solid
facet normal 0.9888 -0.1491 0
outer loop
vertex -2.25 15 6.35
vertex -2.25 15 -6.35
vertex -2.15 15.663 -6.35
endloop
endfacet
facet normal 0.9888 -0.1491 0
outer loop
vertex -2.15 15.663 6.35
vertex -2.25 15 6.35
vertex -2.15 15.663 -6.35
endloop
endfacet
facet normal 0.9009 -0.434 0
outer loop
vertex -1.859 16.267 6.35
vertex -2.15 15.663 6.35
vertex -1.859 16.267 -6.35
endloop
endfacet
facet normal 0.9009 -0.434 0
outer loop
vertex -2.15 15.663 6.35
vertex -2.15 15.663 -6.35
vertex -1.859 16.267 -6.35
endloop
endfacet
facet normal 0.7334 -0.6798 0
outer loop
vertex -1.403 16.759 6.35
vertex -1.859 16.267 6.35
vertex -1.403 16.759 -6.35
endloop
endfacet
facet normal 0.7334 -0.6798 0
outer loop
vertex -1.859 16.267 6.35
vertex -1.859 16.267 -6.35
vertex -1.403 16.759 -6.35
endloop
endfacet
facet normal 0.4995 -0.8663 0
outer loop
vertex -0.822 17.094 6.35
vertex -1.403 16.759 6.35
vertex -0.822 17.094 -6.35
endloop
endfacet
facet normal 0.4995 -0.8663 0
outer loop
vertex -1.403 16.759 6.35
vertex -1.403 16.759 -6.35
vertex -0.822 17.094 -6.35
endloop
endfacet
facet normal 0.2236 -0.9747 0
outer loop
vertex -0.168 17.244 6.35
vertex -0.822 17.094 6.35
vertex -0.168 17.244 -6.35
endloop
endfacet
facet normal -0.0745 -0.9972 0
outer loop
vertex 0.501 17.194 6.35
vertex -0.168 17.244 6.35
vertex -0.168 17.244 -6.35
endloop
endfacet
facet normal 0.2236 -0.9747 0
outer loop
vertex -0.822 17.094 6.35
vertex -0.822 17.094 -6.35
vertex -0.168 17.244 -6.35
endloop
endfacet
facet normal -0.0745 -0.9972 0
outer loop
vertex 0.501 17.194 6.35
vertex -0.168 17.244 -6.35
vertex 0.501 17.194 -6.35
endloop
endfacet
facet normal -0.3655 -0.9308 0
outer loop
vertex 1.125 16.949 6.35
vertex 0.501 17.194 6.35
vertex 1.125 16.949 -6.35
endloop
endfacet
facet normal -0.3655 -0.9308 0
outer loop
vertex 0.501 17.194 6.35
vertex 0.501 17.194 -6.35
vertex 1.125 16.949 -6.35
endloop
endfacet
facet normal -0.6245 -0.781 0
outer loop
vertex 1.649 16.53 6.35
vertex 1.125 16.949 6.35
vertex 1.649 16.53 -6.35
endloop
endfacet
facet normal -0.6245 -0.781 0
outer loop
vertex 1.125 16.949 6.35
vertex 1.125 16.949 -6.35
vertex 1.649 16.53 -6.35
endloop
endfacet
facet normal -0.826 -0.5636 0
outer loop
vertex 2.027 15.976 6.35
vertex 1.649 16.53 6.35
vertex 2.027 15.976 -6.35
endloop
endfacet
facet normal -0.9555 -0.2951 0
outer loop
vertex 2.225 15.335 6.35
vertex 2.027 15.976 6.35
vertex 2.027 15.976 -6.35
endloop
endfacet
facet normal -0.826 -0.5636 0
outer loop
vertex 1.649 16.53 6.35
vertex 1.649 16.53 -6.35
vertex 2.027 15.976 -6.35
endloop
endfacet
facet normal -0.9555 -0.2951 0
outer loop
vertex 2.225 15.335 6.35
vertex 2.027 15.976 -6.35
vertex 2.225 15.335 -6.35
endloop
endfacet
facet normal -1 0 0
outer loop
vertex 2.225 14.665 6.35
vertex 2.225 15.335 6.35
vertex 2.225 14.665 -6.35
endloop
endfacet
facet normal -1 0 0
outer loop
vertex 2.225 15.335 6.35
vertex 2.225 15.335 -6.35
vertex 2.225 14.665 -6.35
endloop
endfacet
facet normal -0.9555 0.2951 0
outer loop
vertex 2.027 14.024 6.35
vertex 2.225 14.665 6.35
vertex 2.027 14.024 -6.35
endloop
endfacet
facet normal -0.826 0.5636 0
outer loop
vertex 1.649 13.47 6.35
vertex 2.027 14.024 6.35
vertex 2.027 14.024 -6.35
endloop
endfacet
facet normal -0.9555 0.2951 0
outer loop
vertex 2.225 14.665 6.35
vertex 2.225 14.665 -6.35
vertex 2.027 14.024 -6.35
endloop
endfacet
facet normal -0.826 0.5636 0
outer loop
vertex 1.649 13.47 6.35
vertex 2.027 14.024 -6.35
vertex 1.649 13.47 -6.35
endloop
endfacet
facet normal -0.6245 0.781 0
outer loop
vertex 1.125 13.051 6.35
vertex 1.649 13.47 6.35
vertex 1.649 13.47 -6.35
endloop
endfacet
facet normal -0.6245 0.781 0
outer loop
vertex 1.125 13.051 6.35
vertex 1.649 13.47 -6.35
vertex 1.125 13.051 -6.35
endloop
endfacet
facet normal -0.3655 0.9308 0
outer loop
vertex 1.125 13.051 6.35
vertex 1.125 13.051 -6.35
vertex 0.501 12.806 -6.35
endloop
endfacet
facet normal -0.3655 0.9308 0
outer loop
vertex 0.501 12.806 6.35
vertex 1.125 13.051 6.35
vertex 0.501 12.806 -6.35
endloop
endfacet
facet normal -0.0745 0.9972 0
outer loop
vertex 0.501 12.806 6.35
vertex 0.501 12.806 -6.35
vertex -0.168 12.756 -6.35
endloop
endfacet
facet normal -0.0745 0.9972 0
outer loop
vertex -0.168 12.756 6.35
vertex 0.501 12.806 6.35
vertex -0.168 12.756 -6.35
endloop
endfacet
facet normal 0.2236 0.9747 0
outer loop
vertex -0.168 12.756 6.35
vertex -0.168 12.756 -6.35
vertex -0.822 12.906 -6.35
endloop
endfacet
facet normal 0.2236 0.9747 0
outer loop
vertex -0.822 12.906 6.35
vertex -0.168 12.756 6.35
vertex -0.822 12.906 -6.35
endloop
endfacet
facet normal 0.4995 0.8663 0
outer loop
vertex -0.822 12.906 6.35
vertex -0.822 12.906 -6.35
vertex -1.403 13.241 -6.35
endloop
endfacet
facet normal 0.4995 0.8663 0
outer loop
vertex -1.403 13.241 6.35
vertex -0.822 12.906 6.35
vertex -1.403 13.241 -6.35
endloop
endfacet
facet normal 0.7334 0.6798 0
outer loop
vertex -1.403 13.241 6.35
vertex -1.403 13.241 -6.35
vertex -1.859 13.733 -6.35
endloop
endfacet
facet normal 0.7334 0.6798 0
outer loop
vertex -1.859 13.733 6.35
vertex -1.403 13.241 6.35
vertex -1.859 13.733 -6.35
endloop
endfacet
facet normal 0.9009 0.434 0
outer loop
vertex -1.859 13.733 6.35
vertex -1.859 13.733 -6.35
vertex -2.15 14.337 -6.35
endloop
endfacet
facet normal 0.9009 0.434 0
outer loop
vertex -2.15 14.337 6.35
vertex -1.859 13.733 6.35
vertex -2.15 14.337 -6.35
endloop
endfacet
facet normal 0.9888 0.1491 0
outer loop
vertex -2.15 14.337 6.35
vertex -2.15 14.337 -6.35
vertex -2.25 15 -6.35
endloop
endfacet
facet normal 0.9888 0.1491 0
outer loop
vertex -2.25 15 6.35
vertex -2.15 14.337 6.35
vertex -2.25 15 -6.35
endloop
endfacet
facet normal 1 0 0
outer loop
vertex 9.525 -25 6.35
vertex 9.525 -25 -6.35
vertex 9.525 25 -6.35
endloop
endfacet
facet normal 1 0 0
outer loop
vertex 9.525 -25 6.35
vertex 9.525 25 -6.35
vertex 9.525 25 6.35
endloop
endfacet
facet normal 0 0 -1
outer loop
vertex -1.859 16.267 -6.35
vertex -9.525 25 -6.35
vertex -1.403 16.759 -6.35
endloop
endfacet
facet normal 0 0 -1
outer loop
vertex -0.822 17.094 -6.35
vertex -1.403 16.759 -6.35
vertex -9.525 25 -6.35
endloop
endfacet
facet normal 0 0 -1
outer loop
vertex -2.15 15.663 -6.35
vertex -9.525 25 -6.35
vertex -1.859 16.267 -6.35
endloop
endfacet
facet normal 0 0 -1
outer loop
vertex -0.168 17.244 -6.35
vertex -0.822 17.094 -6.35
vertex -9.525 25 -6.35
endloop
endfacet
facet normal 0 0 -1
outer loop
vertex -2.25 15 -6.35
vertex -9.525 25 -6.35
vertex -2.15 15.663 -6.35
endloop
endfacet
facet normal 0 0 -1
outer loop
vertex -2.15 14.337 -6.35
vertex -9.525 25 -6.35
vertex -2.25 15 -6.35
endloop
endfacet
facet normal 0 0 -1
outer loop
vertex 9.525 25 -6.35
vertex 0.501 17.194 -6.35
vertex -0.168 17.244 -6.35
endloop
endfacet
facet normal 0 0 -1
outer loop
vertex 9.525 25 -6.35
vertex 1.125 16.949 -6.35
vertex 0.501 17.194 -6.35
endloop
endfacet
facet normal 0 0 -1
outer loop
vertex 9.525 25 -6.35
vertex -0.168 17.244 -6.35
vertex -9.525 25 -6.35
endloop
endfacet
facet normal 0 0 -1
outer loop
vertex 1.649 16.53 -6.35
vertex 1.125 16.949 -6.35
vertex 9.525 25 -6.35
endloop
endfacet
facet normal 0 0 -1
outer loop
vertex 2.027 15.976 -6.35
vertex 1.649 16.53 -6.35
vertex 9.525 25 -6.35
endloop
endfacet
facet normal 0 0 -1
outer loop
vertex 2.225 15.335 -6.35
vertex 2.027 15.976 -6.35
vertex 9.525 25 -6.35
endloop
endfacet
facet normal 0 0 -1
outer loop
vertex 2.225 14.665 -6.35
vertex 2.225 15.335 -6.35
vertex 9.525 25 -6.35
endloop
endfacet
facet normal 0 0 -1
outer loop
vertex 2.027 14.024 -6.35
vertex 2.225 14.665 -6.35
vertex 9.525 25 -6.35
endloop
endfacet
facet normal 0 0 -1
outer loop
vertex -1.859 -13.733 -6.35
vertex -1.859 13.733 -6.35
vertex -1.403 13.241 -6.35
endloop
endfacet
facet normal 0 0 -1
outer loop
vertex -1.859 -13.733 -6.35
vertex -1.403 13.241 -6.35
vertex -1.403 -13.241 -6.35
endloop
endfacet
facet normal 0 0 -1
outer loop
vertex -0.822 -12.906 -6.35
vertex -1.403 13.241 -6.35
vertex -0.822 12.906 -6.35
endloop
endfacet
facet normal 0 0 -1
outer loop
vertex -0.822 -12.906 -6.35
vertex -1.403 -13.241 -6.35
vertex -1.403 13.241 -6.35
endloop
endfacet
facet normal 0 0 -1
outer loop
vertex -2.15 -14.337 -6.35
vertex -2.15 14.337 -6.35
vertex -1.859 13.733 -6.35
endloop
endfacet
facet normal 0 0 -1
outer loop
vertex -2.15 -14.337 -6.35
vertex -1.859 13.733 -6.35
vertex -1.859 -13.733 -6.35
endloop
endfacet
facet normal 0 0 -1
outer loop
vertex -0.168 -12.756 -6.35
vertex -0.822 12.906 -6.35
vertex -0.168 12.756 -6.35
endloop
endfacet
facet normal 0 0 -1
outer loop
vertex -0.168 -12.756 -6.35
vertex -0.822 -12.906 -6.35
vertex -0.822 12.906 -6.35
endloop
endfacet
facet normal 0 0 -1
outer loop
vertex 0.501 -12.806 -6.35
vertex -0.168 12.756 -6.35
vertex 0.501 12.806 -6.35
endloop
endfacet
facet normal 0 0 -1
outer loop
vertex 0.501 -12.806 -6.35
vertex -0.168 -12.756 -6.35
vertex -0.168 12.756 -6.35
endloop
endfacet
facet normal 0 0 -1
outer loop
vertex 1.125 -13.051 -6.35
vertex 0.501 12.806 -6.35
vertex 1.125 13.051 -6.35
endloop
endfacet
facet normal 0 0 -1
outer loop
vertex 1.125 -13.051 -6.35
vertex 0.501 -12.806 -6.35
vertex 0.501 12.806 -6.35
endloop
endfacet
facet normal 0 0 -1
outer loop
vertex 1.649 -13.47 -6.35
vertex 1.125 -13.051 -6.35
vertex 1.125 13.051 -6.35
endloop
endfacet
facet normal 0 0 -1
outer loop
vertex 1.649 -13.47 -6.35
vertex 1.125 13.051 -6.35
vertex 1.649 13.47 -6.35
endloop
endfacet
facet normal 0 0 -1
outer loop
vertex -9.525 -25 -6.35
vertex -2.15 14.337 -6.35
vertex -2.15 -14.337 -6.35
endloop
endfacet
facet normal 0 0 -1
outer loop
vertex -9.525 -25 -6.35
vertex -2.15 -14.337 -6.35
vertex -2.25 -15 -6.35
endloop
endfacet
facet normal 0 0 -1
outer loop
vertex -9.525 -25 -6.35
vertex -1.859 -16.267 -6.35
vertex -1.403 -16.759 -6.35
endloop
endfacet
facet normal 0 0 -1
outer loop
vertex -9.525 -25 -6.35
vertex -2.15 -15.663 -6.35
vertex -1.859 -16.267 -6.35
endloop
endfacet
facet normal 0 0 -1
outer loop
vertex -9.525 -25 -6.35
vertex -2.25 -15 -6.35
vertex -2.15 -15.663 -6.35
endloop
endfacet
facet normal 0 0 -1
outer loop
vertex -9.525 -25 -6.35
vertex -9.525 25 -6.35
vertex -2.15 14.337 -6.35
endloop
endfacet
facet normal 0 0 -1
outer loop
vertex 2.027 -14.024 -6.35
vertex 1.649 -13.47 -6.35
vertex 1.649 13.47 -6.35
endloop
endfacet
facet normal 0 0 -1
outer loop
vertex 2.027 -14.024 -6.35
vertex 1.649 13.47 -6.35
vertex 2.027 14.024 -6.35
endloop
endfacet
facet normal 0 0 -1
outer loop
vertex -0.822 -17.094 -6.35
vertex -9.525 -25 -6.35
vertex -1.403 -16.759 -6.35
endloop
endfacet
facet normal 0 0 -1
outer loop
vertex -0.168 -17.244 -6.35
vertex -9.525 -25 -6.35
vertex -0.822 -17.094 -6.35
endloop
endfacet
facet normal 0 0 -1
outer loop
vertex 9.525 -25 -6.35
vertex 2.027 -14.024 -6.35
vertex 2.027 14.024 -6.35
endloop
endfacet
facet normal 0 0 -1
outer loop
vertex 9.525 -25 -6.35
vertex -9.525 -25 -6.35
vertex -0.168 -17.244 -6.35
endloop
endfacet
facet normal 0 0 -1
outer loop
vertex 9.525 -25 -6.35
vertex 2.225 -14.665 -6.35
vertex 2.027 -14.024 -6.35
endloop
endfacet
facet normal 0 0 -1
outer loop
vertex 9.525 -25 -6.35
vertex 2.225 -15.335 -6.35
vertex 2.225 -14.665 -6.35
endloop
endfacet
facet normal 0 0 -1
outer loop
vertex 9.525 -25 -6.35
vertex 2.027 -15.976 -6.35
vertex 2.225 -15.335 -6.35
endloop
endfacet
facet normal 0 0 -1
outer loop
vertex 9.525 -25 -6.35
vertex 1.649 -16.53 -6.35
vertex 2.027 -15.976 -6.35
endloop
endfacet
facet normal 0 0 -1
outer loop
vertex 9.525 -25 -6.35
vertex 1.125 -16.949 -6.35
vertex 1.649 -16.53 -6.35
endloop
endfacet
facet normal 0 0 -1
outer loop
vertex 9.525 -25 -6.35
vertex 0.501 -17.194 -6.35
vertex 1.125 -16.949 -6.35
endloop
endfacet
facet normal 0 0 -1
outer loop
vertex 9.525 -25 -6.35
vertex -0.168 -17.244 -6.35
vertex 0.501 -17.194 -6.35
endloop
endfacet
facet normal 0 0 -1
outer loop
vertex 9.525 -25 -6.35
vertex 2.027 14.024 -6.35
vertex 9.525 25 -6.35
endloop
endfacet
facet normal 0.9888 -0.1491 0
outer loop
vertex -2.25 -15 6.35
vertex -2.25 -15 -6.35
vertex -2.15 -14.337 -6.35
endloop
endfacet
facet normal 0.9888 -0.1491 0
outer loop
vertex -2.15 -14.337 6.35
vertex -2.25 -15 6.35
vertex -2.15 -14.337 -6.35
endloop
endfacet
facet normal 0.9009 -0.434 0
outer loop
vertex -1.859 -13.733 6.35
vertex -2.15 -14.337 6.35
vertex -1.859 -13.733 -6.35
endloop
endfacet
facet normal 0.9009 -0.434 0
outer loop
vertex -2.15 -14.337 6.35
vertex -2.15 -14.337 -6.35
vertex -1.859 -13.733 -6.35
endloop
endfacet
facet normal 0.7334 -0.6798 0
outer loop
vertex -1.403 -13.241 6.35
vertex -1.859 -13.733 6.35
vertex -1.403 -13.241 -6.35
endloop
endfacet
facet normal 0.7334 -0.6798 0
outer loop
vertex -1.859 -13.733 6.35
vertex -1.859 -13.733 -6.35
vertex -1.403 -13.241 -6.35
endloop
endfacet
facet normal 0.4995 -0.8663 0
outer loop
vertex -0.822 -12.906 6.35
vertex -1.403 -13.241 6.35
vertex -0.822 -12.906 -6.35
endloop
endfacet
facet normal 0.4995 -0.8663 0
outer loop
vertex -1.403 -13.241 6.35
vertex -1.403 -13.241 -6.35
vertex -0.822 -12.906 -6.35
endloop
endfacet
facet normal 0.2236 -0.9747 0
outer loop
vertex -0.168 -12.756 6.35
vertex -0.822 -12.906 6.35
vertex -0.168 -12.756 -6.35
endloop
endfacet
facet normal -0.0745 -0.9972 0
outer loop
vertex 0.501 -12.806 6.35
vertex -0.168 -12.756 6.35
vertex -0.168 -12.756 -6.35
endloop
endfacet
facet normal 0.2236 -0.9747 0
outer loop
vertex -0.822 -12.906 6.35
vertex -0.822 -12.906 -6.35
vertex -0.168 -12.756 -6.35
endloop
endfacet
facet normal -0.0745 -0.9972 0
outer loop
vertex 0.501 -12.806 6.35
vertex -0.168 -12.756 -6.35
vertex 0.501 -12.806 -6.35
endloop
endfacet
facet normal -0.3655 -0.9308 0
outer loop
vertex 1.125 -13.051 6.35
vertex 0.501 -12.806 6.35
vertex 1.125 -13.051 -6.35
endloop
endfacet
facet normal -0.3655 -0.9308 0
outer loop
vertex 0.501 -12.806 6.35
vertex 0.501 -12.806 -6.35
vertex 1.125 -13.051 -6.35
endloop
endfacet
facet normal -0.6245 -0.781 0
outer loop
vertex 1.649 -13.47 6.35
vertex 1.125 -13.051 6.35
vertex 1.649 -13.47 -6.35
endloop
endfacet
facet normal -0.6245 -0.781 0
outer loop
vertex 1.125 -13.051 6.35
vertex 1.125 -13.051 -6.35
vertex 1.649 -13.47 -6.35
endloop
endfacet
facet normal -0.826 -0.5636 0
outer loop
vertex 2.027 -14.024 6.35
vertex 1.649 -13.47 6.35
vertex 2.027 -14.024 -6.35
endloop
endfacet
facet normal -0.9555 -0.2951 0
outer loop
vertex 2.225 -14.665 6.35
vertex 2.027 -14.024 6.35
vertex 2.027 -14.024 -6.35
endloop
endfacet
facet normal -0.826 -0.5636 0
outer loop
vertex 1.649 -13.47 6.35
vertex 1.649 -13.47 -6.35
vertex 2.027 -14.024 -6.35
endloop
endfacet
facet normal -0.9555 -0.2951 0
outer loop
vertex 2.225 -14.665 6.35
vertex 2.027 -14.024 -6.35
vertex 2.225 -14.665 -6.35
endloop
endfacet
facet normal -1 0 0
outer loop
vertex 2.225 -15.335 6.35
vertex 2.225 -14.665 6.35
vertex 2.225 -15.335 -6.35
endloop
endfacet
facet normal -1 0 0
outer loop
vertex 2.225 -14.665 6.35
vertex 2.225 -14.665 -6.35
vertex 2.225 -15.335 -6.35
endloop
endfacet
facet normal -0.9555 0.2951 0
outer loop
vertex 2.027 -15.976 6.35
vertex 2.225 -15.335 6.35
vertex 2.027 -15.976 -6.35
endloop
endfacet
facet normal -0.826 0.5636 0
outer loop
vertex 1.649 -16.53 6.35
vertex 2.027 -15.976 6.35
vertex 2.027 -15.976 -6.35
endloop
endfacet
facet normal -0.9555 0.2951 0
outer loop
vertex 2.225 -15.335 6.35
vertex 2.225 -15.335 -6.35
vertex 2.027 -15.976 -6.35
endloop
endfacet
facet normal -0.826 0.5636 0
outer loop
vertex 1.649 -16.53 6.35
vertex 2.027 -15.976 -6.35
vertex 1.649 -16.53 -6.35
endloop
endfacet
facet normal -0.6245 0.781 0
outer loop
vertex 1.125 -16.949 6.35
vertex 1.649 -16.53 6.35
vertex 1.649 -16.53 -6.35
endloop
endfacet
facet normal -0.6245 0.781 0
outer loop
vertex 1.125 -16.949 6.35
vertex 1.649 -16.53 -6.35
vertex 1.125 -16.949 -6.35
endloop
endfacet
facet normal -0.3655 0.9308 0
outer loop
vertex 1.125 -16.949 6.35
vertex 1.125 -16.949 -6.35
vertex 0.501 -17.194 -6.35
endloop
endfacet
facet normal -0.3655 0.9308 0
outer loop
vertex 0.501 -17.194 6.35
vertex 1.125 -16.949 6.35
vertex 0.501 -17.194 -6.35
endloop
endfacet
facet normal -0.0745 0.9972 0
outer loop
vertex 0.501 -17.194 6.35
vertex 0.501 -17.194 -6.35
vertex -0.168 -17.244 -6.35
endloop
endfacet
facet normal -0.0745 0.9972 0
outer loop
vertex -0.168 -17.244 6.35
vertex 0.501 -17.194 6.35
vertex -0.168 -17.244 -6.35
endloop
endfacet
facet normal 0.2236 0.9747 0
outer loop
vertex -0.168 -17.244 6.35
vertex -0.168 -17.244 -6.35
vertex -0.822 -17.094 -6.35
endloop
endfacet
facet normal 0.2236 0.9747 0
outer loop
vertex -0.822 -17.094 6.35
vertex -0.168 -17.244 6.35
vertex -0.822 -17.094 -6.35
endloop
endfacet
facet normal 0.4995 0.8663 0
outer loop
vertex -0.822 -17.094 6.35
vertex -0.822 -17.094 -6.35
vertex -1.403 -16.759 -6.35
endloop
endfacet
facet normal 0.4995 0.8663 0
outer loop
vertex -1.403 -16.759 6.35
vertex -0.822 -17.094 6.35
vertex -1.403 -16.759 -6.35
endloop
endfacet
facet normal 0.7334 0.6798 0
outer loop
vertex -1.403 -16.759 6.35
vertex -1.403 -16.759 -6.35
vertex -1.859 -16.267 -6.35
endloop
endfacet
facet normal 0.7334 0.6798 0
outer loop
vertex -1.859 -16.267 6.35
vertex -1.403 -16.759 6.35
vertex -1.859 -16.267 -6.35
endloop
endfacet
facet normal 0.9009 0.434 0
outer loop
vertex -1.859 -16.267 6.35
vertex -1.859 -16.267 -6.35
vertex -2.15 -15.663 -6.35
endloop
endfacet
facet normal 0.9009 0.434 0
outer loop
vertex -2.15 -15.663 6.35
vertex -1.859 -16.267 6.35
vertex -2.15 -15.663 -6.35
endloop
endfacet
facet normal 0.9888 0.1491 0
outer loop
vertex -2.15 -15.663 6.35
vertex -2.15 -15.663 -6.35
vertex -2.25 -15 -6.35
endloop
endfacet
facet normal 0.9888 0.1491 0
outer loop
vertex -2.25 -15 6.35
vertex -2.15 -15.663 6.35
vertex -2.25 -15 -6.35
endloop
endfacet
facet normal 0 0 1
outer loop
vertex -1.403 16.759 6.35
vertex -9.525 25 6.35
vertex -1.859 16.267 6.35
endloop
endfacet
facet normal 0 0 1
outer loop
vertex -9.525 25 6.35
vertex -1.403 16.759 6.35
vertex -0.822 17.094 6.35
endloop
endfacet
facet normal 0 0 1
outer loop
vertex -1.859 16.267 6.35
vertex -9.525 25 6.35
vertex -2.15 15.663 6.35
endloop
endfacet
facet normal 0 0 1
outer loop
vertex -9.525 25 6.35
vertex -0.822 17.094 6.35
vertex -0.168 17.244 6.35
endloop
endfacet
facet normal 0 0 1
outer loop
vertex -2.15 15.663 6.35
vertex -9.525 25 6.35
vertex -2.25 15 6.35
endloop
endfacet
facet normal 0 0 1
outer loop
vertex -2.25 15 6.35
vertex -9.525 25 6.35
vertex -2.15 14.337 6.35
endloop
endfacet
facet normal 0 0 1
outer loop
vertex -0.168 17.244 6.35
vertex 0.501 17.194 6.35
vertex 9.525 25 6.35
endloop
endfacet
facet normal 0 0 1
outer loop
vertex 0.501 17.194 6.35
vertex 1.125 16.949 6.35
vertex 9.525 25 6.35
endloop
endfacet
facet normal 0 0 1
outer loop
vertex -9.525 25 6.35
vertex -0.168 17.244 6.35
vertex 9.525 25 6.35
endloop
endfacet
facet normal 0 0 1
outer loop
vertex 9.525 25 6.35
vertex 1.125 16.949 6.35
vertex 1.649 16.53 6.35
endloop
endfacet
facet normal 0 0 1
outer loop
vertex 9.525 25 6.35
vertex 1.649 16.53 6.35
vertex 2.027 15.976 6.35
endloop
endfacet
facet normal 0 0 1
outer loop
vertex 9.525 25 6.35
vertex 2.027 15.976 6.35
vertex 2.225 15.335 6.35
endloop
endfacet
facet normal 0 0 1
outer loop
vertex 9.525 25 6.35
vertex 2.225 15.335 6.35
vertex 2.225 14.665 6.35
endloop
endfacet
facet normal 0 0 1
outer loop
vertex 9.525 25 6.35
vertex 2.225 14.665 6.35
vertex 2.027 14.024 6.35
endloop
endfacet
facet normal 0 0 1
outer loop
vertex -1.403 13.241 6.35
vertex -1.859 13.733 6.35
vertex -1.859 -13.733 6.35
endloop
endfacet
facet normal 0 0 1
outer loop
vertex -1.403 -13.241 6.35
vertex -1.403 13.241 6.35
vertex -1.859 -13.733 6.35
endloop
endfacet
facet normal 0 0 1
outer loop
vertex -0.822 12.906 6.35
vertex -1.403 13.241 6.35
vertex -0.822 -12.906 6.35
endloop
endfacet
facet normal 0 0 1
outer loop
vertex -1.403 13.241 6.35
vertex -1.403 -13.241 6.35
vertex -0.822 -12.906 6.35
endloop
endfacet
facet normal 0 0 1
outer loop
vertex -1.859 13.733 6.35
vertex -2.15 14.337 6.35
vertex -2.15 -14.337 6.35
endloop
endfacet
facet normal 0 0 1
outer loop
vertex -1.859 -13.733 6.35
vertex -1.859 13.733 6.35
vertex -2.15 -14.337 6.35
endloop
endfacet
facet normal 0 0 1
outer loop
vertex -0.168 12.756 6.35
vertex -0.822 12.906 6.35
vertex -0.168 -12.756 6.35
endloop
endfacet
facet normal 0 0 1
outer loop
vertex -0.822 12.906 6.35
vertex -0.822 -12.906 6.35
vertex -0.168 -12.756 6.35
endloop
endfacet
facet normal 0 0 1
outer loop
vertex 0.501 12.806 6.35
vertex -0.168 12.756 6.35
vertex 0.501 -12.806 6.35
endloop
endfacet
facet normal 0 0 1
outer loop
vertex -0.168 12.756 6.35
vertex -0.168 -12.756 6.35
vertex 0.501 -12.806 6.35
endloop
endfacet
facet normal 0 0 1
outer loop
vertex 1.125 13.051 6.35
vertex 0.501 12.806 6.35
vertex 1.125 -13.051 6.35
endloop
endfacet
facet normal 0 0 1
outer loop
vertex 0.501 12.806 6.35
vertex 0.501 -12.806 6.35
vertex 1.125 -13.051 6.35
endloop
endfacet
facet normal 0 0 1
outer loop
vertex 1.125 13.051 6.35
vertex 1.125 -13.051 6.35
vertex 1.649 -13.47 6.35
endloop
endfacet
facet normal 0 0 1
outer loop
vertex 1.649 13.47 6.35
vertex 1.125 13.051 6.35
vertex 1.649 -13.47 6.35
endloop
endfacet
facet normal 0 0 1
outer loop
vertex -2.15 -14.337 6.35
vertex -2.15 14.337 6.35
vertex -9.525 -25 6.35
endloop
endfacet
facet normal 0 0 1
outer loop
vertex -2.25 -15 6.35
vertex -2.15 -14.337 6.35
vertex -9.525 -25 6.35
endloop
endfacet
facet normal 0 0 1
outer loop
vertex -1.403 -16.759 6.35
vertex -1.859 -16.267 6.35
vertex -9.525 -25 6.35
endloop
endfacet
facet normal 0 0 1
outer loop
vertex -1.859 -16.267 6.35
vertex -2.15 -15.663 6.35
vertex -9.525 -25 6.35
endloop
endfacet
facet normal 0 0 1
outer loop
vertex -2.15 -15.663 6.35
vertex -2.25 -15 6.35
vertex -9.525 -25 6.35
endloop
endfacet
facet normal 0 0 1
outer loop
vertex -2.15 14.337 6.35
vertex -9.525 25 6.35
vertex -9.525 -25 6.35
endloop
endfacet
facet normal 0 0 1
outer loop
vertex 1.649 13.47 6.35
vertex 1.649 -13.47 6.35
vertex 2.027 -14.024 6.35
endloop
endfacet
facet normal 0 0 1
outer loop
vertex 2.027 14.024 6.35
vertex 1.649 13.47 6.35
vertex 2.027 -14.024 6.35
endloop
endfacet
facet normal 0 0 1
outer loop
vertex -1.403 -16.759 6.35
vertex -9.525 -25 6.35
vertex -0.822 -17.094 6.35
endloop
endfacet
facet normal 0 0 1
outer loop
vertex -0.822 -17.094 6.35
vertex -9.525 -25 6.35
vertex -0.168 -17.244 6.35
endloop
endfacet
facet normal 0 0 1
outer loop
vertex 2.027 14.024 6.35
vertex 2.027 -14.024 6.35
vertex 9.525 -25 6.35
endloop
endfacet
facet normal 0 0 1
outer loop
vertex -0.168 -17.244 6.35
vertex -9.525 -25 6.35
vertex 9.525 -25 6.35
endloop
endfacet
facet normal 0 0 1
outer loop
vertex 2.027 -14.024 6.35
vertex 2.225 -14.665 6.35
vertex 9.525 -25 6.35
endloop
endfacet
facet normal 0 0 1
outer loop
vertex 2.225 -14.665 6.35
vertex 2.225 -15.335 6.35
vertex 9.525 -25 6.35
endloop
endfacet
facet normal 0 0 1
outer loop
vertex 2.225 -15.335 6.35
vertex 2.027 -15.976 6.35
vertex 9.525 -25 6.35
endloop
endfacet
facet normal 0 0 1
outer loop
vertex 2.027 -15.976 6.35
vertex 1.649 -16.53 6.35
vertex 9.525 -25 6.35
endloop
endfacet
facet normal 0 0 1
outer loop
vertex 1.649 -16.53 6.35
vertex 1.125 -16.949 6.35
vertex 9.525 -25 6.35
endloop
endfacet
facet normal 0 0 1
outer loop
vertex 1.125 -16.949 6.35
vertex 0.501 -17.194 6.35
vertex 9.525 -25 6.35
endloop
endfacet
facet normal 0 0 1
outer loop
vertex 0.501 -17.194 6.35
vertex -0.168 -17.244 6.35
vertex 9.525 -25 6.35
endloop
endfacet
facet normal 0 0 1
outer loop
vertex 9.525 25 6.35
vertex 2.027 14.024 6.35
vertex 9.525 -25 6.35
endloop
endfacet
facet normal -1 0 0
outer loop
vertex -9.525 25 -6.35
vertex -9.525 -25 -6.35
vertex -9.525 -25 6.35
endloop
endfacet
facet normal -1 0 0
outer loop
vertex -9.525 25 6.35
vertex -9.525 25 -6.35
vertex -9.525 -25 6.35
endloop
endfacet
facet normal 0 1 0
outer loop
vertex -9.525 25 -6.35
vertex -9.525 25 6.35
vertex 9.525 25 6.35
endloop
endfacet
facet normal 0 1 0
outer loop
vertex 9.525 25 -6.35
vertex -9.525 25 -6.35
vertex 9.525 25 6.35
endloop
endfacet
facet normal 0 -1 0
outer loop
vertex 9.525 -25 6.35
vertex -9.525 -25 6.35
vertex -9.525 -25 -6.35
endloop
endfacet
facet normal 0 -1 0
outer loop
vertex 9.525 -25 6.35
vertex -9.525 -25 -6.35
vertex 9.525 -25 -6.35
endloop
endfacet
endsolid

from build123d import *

# Parameters (mm, degrees)
F0_W     = 19.05
F0_H     = 12.7
F1_DEPTH = 25
F3_D     = 4.5


with BuildPart() as f1:
    # F0 (on Front) → F1 (new body, symmetric)
    with BuildSketch(Plane.XZ):
        Rectangle(F0_W, F0_H)
    extrude(amount=F1_DEPTH, both=True)

    # F3 (through all)
    with Locations(Plane.XY.offset(6.35)):
        with Locations((0, 15), (0, -15)):
            Hole(F3_D / 2)


solid = f1.part
